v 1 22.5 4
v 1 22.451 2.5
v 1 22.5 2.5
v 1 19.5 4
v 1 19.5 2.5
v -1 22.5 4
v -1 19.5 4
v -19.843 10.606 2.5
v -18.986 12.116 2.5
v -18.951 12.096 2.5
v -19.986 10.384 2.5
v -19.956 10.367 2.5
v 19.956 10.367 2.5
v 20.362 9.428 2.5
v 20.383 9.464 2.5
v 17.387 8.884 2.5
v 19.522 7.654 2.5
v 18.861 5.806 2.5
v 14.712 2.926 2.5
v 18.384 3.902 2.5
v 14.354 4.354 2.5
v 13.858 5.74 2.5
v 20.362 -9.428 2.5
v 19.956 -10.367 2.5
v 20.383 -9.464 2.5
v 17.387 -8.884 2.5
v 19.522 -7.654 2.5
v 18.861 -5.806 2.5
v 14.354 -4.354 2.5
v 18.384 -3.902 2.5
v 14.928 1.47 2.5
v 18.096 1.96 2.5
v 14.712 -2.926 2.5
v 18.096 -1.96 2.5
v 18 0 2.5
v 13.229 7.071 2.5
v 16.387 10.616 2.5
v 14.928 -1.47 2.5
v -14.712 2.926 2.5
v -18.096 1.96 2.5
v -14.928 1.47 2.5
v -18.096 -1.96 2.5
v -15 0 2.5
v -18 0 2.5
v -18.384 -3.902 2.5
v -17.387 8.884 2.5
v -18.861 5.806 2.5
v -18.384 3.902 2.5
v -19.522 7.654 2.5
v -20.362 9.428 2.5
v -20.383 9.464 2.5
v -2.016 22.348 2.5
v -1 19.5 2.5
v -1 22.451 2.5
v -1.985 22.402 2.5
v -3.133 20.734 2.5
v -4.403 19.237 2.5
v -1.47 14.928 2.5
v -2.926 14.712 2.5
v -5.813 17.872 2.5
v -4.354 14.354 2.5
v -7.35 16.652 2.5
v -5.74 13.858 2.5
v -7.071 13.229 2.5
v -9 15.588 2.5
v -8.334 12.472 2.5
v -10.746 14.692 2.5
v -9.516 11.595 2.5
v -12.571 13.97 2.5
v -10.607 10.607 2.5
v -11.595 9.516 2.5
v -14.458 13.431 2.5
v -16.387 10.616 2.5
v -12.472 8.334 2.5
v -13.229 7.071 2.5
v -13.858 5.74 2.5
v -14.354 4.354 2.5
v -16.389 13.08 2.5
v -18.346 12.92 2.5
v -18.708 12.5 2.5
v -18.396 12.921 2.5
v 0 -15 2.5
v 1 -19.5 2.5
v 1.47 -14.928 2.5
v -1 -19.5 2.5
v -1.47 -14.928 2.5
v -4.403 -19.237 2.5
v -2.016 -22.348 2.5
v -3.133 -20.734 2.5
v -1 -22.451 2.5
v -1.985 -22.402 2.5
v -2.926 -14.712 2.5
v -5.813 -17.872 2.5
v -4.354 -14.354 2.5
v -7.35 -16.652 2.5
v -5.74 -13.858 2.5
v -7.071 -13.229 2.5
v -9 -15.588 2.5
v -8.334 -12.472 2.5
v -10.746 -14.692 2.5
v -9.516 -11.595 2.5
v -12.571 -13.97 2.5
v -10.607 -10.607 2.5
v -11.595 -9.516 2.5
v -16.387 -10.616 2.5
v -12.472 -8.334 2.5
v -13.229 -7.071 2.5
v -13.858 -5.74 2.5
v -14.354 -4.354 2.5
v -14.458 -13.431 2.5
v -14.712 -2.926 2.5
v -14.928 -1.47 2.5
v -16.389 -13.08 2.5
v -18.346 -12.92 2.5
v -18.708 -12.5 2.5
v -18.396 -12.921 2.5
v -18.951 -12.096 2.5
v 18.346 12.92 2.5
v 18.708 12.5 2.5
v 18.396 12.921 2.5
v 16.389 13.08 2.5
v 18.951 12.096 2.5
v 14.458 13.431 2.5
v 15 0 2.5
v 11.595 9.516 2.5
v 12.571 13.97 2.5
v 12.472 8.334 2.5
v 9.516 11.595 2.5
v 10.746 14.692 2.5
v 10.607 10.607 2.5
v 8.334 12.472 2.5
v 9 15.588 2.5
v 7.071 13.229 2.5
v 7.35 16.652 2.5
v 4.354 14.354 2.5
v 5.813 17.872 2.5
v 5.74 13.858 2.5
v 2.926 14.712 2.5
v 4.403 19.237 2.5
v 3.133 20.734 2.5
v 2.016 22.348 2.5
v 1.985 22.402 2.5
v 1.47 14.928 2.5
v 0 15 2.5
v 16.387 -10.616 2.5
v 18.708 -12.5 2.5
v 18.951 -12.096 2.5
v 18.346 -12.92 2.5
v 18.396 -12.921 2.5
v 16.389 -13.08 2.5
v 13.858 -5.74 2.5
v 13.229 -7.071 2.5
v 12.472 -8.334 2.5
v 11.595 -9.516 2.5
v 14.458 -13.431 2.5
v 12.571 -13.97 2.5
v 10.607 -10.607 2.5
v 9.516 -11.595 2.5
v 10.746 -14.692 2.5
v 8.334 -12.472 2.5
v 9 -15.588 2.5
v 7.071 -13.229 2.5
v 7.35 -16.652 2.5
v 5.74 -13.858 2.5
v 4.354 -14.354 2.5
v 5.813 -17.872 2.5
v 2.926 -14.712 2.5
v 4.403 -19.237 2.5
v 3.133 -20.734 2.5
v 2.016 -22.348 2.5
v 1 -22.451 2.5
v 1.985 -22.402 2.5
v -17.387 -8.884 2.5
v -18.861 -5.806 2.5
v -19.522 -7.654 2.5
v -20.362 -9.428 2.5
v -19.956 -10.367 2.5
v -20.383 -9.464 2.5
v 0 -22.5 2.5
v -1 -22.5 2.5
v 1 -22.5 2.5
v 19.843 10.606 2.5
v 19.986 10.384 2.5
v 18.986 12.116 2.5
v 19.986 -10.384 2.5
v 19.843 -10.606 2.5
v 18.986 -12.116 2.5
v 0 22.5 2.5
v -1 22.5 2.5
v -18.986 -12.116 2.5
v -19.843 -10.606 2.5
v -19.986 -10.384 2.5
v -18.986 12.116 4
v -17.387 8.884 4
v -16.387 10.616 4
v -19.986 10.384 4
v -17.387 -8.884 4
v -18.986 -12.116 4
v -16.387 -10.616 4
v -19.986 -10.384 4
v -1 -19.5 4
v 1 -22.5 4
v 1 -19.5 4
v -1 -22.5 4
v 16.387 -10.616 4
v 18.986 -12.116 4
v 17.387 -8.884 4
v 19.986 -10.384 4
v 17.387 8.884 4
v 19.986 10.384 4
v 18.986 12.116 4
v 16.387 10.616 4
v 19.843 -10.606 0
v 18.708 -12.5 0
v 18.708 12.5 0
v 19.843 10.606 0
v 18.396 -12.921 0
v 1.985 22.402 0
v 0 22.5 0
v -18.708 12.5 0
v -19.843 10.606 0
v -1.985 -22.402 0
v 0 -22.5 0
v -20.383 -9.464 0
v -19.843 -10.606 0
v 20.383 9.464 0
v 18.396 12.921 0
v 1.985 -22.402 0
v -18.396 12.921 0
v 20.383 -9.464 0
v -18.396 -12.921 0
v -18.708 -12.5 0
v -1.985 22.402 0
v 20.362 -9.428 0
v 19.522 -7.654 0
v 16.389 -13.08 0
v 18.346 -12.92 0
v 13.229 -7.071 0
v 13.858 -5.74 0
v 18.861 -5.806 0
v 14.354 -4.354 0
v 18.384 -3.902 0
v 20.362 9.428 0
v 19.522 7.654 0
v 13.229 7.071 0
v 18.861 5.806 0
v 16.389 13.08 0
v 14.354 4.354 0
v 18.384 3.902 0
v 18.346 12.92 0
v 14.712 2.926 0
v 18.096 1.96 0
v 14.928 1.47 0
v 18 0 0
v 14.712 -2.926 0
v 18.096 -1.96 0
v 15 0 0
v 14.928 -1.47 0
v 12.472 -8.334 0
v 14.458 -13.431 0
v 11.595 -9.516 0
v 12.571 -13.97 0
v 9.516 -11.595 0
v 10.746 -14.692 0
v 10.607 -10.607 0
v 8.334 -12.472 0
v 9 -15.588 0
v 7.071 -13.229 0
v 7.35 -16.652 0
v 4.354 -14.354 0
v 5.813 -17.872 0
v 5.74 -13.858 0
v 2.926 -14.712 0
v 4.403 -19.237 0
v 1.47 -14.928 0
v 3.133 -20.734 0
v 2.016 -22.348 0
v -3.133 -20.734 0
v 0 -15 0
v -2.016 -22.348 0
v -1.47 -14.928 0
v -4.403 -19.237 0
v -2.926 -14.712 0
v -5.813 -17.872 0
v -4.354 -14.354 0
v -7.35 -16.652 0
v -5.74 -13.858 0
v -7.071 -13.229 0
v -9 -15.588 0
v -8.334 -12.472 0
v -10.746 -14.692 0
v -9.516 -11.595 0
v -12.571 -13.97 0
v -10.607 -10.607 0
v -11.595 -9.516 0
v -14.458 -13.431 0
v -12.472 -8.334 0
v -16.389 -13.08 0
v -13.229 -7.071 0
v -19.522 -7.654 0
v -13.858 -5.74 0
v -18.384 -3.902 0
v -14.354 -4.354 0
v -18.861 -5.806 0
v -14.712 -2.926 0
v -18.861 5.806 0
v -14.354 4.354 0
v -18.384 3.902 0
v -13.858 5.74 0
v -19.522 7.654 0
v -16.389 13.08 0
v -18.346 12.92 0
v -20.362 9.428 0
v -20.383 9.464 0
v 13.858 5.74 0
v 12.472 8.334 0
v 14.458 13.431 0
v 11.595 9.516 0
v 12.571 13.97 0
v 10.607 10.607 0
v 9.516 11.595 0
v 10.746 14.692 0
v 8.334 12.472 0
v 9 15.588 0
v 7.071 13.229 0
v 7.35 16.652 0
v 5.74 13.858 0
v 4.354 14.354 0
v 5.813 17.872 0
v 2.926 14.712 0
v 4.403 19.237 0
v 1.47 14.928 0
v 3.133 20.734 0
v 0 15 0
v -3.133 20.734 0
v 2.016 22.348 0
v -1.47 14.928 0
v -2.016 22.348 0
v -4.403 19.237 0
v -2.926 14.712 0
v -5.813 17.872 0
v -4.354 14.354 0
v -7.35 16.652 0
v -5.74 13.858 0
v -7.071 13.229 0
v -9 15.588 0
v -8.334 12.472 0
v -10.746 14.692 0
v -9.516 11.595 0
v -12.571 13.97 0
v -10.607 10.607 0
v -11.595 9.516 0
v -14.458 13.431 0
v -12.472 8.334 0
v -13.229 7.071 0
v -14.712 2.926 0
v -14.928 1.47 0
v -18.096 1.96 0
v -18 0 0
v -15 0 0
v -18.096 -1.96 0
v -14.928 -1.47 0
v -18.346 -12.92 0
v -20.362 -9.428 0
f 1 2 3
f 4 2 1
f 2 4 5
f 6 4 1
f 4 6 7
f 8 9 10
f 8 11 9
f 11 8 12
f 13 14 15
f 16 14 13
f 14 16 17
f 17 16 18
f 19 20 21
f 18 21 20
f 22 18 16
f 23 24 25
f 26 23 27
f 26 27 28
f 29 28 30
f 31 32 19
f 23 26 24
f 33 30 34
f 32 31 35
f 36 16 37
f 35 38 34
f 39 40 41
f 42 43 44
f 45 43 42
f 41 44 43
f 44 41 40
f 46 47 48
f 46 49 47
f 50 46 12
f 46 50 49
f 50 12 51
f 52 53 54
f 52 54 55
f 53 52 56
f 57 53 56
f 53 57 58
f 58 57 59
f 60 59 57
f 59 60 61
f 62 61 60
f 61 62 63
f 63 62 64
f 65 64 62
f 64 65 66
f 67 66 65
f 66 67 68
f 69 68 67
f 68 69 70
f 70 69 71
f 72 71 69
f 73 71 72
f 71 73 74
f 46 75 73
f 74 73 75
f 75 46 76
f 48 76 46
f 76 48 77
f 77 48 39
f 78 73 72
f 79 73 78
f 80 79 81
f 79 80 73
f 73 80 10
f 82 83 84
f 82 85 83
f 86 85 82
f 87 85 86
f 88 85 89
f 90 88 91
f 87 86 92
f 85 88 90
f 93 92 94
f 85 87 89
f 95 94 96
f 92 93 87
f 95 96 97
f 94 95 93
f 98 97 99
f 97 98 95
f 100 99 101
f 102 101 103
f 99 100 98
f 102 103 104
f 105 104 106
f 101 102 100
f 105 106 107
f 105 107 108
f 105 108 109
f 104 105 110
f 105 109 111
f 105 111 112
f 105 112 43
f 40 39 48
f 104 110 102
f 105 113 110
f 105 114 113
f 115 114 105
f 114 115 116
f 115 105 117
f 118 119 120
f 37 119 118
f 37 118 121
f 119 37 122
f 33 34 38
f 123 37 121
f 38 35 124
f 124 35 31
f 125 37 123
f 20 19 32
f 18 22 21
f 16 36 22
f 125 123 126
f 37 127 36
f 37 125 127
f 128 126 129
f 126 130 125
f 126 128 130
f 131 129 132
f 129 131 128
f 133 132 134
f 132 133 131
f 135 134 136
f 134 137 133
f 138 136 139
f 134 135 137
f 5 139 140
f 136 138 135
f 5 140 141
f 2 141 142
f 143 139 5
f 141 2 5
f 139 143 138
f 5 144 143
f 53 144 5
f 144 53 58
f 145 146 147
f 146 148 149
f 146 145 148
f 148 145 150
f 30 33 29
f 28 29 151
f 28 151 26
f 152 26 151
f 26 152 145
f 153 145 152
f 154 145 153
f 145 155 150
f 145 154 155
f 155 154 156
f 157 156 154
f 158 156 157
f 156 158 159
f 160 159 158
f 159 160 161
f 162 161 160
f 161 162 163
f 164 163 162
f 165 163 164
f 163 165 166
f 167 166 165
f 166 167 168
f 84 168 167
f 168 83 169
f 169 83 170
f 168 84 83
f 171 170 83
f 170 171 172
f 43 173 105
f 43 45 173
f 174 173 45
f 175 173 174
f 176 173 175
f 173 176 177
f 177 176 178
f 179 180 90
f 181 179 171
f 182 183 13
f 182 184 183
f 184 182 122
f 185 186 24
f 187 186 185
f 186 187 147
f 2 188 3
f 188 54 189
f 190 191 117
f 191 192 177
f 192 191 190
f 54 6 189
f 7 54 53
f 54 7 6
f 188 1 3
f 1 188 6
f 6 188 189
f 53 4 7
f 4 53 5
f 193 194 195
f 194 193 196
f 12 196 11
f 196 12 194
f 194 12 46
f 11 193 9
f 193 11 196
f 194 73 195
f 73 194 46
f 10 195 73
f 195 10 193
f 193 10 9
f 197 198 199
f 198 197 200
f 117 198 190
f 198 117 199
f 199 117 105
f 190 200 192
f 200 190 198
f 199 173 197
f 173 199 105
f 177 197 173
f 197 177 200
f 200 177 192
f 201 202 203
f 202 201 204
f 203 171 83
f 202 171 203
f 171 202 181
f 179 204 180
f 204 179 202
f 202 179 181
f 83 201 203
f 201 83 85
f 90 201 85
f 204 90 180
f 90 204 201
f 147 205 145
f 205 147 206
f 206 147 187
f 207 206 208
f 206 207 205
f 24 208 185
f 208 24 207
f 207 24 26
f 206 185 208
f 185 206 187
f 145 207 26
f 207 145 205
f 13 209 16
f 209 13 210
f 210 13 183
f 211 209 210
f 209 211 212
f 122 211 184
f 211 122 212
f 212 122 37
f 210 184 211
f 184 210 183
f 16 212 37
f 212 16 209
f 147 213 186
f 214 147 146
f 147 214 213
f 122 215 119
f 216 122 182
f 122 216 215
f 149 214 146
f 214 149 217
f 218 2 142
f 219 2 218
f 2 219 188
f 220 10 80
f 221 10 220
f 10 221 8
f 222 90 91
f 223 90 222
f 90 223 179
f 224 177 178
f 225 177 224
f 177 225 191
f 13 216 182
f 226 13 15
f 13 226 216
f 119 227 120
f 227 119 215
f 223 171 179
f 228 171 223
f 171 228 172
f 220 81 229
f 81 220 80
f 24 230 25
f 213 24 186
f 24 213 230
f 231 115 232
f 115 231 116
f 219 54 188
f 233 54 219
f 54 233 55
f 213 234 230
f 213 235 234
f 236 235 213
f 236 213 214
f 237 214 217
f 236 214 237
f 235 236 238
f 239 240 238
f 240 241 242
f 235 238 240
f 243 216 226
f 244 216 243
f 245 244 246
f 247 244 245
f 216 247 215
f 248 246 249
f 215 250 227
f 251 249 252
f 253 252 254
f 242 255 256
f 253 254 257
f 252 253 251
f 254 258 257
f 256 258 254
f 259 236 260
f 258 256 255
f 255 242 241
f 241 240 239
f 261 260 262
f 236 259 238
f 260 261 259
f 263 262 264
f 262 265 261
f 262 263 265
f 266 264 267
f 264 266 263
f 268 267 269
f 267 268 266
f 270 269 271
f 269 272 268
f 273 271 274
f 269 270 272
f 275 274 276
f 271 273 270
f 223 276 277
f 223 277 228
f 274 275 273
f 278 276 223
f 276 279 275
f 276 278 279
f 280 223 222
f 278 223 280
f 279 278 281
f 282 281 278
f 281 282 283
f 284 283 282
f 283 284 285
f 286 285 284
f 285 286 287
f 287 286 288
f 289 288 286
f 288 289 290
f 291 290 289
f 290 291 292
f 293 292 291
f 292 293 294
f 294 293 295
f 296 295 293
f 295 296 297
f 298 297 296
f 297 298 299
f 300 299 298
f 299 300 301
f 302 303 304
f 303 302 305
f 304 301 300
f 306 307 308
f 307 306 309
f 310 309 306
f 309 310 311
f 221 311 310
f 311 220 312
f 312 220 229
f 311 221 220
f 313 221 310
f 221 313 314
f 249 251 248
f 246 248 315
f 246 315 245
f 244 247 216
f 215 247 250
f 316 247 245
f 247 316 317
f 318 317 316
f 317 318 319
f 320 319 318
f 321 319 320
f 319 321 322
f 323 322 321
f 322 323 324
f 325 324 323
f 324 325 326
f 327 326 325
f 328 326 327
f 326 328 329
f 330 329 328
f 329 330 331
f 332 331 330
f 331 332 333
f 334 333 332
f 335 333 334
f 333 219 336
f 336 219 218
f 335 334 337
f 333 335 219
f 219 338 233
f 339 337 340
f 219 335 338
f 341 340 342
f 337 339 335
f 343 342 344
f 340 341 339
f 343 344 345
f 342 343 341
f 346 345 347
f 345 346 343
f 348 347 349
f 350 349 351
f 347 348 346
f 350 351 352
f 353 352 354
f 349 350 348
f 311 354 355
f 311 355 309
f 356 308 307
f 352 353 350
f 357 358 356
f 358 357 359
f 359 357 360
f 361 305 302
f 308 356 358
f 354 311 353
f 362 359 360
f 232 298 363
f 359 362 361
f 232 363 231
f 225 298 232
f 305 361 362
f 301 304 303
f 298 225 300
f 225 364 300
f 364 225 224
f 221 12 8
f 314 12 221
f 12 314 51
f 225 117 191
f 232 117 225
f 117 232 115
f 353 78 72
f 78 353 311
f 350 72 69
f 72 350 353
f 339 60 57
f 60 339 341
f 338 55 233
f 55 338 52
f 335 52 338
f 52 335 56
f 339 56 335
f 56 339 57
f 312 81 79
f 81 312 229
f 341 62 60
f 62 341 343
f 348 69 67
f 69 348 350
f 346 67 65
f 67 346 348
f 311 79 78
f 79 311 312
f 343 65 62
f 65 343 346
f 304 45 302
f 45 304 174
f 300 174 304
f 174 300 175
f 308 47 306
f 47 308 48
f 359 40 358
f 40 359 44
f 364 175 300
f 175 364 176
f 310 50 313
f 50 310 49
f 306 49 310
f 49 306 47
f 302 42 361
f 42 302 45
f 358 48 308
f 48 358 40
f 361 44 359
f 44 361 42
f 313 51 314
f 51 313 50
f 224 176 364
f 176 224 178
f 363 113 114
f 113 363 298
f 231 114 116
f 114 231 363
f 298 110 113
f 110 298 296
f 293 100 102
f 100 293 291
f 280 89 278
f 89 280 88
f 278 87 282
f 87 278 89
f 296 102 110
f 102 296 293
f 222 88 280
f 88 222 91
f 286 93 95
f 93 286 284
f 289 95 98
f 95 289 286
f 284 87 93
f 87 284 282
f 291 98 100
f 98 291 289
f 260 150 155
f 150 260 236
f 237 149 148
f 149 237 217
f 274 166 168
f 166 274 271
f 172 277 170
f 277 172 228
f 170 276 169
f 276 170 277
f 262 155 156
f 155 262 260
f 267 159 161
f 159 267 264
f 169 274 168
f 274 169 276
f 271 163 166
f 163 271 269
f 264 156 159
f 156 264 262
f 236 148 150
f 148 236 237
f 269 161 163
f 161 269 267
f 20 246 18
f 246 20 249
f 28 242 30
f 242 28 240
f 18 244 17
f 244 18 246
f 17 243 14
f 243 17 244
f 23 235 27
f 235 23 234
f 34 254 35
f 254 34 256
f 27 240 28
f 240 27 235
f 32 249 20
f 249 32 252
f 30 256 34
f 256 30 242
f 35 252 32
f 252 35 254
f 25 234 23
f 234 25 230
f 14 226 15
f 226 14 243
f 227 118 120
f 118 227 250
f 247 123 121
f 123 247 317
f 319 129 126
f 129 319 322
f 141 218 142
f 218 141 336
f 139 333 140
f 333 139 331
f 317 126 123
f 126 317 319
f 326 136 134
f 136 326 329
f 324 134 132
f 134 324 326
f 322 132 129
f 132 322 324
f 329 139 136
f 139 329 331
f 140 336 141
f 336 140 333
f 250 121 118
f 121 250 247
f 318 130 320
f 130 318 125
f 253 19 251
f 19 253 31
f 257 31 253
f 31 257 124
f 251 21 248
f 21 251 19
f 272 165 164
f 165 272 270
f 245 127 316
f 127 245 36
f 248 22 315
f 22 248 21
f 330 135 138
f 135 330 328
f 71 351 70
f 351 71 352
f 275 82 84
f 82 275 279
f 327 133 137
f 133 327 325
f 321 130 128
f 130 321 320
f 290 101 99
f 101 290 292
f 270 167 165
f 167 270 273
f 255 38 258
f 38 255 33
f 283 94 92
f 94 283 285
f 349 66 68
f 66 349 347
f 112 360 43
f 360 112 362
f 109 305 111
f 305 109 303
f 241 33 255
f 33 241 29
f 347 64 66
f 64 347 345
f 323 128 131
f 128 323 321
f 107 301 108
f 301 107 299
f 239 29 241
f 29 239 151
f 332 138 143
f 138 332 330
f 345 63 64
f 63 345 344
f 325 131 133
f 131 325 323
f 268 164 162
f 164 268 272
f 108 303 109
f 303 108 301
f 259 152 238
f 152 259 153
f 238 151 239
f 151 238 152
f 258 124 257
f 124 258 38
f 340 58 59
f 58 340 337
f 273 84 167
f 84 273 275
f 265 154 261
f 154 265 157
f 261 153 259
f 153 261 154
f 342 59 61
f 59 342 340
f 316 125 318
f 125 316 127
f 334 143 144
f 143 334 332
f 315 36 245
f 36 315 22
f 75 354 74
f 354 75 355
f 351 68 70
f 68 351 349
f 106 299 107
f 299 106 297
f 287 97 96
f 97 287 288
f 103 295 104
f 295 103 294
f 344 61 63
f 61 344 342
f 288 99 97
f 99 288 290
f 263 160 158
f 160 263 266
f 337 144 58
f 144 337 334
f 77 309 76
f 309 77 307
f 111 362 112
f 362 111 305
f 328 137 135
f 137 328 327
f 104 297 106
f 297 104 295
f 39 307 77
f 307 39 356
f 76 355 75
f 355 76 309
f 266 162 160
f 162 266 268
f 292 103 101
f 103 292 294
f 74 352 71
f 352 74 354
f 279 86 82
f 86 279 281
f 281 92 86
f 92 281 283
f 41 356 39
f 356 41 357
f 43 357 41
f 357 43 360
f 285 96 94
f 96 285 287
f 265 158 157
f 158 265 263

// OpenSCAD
$fn=200;

tol=0.5;

diameter_back_cover = 44+2*tol;
diameter_pins = 2;
base_heigth = 2.5;
pins_heigth = 1.5;
radius_pins = 19+tol;
diameter_finger_cutout = 40;
distance_finger_cutout_to_center = 38;
diameter_cutout_cylinder_center = 30;

res=64;
stab=1;

// cube([1,38,10],center=true);

difference(){
  union(){
    // Base
    cylinder(d=diameter_back_cover,h=base_heigth,$fn=res);

    // Pins
    translate([0,0,base_heigth])
    for ( i = [0 : 5] ){
      // rotate( i * 60, [0, 0, 1])
      // translate([0, radius_pins, 0])
      // cylinder(d=diameter_pins,h=pins_heigth,$fn=res);
      rotate( i * 60, [0, 0, 1])
      translate([0, radius_pins+diameter_pins/2+stab/2, pins_heigth/2])
      cube([diameter_pins,diameter_pins+stab,pins_heigth],center=true);
    }
  }

  // Cutouts for fingers
  rotate(30,[0,0,1])
  for ( i = [0 : 5] ){
    rotate( i * 60, [0, 0, 1])
    translate([0, distance_finger_cutout_to_center, 0])
    cylinder(d=diameter_finger_cutout,h=base_heigth,$fn=res);
  }

  // Cutout in the middle
  cylinder(d=diameter_cutout_cylinder_center,h=base_heigth,$fn=res);
}
